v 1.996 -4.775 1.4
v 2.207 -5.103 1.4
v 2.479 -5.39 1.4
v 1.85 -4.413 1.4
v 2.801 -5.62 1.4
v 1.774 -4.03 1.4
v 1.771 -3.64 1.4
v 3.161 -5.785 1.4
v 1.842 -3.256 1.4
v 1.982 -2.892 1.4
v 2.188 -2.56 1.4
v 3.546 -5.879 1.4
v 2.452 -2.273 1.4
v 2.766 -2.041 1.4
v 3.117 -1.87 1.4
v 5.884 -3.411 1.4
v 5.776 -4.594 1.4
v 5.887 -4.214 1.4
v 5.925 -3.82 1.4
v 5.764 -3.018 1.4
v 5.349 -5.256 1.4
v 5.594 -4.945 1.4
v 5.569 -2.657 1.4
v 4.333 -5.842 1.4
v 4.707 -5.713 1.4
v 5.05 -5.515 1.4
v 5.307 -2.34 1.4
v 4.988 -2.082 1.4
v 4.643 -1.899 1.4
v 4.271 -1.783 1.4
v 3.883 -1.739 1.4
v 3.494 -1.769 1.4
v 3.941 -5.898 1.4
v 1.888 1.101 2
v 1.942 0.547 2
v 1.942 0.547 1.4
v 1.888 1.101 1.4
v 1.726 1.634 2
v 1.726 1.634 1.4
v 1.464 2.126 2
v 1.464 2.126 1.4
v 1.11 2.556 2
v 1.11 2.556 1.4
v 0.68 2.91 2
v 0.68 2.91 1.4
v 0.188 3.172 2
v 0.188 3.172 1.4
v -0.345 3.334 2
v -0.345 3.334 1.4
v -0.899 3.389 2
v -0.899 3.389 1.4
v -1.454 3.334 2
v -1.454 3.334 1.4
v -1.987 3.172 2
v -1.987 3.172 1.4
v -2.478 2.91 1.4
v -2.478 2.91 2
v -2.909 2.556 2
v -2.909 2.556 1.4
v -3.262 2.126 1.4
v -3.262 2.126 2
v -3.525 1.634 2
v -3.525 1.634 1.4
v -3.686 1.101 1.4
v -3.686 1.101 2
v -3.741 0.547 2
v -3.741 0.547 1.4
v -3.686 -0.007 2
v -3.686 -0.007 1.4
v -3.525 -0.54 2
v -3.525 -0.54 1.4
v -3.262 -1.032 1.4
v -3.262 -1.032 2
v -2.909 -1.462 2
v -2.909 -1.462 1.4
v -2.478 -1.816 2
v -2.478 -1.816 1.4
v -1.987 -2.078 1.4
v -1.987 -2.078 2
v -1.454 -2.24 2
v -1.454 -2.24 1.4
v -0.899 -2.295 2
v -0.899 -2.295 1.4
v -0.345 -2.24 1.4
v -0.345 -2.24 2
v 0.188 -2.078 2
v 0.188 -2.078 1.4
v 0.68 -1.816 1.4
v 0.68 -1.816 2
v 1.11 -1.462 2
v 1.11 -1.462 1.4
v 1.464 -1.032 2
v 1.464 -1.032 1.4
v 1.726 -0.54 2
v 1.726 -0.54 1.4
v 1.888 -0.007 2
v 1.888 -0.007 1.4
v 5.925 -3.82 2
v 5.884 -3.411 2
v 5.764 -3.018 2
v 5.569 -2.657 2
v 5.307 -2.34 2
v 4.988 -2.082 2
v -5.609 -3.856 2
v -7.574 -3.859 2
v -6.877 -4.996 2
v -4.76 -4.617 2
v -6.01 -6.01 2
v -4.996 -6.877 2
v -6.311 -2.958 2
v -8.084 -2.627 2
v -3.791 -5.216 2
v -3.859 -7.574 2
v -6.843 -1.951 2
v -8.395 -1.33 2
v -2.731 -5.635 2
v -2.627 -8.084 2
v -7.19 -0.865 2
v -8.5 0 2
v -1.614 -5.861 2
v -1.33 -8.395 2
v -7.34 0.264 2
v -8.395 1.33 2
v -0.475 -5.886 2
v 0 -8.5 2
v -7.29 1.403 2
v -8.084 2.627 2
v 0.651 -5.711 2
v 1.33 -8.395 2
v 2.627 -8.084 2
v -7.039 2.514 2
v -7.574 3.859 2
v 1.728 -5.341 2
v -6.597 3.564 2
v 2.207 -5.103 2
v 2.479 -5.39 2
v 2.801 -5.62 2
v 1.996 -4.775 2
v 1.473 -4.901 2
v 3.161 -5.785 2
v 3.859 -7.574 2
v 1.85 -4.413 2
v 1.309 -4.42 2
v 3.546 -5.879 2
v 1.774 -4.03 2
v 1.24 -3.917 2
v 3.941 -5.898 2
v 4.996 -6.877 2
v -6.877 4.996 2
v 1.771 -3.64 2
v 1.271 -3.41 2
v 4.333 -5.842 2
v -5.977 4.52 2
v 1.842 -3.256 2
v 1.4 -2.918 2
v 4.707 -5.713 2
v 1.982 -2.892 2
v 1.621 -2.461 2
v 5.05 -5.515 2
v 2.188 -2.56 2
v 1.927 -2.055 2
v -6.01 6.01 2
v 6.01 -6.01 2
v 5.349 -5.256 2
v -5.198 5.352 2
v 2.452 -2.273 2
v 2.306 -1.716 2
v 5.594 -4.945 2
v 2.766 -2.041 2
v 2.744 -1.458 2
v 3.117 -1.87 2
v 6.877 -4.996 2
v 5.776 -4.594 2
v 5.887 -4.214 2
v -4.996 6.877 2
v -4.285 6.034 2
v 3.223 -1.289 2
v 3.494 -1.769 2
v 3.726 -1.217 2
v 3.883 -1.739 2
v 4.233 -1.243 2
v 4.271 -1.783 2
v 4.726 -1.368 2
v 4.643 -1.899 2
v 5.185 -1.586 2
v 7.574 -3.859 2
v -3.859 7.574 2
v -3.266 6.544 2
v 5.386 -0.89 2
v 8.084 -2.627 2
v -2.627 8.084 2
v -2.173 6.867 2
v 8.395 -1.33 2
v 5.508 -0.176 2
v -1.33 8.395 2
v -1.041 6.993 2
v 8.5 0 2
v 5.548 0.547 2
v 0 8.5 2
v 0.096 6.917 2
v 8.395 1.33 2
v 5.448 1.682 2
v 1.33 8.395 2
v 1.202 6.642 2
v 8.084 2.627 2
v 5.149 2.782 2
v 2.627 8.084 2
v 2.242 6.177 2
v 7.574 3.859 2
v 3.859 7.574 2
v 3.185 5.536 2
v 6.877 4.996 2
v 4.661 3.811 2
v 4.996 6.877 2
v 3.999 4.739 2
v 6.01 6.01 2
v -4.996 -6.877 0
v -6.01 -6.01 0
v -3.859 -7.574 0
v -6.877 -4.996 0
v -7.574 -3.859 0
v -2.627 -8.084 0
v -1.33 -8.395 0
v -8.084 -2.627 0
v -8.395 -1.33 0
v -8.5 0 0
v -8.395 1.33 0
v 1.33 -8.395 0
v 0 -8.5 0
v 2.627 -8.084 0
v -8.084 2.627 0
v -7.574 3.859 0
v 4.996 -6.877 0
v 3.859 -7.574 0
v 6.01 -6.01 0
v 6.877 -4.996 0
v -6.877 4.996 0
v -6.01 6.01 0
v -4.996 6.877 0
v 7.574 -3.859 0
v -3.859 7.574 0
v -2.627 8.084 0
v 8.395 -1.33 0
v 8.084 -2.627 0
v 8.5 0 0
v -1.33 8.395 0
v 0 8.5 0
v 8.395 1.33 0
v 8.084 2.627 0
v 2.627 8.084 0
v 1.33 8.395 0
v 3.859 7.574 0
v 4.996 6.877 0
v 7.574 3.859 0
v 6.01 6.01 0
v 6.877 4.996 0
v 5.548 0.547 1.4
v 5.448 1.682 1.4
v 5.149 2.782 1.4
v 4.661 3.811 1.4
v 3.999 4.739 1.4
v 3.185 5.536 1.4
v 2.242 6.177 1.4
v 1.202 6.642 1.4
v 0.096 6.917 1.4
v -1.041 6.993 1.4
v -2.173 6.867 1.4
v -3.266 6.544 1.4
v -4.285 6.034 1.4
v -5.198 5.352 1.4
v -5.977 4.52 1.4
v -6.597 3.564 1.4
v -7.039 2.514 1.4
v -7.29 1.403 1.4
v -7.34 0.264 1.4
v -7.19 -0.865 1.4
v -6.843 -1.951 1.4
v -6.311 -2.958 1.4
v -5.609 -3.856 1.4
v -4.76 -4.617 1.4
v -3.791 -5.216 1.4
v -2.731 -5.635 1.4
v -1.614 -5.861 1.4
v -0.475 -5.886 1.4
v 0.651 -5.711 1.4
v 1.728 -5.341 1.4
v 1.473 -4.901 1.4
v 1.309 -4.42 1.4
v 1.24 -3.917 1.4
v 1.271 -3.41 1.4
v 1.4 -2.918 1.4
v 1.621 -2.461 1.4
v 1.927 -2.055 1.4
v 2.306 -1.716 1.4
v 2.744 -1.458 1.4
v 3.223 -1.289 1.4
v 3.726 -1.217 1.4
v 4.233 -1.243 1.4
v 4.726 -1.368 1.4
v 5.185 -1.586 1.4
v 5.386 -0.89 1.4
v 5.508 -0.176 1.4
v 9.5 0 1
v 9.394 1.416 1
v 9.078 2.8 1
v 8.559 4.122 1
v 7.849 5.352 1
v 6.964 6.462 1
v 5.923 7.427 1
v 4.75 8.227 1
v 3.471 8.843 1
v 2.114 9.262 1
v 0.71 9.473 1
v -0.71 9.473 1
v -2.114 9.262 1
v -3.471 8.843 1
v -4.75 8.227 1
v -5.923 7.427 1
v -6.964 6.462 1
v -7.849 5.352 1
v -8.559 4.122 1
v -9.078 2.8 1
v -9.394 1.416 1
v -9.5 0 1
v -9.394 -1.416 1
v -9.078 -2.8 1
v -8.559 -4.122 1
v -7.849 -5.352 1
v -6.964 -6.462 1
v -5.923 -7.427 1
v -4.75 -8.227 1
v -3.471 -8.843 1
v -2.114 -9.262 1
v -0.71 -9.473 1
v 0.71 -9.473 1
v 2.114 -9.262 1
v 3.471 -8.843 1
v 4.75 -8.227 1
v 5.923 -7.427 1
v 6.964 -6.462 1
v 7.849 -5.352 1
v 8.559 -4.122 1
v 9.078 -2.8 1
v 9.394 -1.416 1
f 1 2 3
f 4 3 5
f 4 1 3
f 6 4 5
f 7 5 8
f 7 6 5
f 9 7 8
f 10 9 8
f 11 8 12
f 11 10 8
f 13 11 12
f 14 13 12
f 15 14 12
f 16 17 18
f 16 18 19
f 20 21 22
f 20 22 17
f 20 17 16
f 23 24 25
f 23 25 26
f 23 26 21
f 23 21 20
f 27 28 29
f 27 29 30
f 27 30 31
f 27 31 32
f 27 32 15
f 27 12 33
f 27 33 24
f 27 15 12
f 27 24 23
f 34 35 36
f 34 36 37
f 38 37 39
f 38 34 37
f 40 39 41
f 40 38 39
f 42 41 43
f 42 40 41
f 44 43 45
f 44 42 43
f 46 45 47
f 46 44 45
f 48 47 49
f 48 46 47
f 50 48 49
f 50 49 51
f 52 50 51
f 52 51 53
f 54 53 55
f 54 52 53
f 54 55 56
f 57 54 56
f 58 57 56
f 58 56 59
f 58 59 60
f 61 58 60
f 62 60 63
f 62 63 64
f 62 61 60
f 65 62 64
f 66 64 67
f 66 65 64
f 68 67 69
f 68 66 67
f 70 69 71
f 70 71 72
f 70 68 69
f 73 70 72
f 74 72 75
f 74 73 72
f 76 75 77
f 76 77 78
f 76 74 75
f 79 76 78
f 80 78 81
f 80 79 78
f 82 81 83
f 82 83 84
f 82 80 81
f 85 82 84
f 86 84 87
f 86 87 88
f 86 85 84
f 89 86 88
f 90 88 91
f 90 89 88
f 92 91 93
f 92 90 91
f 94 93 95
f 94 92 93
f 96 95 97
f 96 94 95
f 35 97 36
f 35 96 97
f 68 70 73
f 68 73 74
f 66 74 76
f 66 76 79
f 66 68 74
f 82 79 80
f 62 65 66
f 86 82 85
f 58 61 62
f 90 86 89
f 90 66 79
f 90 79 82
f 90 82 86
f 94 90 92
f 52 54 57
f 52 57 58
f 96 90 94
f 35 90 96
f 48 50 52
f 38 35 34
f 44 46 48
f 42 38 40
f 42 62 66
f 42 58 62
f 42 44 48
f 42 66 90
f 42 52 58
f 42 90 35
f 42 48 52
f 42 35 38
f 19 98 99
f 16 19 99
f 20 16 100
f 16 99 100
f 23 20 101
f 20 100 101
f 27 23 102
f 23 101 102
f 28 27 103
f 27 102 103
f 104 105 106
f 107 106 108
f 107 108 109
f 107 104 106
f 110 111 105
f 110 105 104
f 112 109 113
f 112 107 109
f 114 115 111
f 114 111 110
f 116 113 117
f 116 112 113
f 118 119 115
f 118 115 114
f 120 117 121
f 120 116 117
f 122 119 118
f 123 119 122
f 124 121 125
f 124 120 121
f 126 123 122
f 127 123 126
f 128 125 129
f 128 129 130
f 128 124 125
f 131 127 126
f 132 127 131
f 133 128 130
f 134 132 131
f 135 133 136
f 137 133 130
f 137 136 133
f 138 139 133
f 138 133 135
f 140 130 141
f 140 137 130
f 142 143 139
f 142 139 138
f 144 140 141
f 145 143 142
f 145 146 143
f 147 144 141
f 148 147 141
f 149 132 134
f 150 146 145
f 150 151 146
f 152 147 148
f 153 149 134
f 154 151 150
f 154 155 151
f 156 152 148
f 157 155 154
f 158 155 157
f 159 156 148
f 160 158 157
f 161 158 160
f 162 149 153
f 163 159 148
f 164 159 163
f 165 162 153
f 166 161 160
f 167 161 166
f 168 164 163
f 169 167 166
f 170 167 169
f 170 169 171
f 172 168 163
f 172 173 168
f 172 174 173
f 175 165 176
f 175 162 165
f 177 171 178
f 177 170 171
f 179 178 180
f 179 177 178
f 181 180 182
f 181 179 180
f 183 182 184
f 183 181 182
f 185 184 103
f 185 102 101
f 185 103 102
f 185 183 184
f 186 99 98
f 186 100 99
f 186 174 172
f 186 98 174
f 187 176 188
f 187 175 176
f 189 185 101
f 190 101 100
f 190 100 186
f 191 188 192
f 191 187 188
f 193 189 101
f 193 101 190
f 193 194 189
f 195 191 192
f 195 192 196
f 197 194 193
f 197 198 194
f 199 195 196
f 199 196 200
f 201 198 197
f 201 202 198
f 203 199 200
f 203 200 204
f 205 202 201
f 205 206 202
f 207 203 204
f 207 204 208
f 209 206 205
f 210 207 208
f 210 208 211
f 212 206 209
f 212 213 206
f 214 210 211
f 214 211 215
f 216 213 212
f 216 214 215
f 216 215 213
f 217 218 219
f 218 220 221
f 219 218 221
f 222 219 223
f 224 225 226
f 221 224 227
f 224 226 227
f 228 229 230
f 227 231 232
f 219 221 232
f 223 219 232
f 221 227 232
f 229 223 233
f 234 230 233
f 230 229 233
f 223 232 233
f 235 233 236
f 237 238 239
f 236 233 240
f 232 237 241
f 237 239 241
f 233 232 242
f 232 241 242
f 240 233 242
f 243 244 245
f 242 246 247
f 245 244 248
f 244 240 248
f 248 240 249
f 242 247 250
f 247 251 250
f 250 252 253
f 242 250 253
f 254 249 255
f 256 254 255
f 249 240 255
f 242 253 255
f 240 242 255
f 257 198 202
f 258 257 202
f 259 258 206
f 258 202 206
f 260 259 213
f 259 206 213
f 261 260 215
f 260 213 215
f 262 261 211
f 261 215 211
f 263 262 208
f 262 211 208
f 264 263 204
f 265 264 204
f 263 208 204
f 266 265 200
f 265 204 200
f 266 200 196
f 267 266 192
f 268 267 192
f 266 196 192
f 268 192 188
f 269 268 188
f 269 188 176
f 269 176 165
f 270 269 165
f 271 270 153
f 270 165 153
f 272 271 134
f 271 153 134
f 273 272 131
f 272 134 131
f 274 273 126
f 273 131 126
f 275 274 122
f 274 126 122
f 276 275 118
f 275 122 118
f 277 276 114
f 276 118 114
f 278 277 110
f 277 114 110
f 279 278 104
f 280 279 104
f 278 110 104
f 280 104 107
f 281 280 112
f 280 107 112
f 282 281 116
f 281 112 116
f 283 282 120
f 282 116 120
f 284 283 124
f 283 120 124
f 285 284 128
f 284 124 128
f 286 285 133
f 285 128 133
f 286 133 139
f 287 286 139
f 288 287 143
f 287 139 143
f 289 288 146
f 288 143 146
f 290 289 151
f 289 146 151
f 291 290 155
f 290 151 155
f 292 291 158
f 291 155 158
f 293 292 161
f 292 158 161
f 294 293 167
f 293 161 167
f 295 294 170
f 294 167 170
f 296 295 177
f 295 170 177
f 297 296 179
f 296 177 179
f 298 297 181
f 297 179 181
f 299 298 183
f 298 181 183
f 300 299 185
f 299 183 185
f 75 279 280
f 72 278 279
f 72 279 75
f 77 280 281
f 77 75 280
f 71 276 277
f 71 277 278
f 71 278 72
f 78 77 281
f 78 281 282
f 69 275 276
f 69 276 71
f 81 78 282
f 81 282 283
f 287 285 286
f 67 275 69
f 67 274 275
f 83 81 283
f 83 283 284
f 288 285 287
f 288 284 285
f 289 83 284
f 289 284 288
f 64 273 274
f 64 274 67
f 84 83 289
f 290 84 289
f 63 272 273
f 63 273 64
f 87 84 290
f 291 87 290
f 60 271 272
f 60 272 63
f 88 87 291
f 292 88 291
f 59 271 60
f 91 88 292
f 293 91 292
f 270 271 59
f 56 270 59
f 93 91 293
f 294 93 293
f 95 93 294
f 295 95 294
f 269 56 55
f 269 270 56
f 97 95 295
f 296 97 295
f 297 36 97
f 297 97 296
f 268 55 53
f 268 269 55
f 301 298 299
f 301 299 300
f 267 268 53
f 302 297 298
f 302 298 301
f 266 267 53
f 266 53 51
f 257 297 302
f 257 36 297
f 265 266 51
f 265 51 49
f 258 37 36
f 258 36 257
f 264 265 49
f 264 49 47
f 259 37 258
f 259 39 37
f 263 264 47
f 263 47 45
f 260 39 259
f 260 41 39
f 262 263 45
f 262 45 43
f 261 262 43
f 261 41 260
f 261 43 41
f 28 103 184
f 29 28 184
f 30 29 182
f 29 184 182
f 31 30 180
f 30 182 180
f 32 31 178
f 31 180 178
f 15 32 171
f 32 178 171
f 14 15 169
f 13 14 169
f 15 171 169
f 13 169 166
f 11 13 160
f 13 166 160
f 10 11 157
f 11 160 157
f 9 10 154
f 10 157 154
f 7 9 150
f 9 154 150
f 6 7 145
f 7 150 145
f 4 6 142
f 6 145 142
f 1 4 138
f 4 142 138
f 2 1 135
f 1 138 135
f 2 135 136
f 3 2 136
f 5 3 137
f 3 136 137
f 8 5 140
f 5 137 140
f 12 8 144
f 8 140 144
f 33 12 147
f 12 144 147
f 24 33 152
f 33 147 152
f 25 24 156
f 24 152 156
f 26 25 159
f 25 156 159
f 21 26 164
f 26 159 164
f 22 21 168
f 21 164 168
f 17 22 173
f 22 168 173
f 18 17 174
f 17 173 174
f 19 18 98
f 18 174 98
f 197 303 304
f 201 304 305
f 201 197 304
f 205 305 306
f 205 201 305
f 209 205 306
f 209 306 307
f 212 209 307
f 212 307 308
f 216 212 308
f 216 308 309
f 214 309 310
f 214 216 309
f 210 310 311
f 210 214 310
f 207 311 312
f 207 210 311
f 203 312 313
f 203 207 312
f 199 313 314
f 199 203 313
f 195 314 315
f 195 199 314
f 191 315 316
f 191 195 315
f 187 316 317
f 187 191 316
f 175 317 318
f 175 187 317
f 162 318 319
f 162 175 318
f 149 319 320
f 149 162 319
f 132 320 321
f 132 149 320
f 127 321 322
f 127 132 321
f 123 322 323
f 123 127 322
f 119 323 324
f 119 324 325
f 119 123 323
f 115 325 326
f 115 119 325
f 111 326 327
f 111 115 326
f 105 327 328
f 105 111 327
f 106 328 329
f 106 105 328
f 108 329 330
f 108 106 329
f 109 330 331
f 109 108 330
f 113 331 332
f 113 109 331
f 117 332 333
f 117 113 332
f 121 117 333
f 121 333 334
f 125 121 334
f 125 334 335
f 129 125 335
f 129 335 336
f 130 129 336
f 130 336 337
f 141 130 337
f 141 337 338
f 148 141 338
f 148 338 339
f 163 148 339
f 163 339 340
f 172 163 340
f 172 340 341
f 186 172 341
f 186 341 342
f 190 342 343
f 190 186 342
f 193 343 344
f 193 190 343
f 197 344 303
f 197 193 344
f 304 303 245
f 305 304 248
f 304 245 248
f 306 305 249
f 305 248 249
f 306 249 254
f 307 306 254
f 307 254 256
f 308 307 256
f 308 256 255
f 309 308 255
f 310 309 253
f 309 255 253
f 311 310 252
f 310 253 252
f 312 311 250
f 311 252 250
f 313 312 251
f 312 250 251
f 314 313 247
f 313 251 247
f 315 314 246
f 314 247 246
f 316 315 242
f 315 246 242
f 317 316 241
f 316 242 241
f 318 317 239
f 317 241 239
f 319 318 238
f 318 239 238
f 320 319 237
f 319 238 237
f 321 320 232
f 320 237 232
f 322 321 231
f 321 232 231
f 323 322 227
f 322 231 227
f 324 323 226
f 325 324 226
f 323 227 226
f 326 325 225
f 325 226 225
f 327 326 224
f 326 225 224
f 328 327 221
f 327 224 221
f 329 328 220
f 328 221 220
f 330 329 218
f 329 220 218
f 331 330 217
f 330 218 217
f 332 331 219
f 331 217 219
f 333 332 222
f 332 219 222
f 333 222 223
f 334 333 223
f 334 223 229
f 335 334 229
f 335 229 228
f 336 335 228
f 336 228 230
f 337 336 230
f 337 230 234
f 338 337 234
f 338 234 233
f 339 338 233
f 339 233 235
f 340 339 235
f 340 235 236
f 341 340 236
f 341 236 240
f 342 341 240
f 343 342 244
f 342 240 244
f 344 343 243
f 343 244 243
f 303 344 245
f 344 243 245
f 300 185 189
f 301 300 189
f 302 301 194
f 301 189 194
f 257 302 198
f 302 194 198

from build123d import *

# Parameters (mm, degrees)
F0_R     = 9.5
F1_DEPTH = 2
F2_SIZE  = 0.99999
F3_R     = 2.8417127556
F4_DEPTH = 0.6


# Not quite as in the source:
# - a fillet or chamfer is up to 0.001 mm smaller than in the source, because OpenCascade refuses the exact size


with BuildPart() as f1:
    # F0 (on Top) → F1 (new body)
    with BuildSketch(Plane.XY):
        Circle(F0_R)
    extrude(amount=F1_DEPTH)

    # F2 (size 1 in the source; OpenCascade refuses exactly that, so slightly less here)
    f2_edges = [f1.edges().sort_by_distance(p)[0] for p in [
        (-9.5, 0, 2),
        (-9.5, 0, 0),
    ]]
    chamfer(f2_edges, length=F2_SIZE)

    # F3 (on face) → F4 (cut)
    with BuildSketch(Plane.XY.offset(2)):
        with BuildLine():
            ThreePointArc((5.185311865, -1.585620522), (5.4568534532, -0.5346363532), (5.5482306838, 0.5470071919))
            ThreePointArc((5.5482306838, 0.5470071919), (-6.3080923619, 4.0561385788), (1.7284324719, -5.3407049258))
            ThreePointArc((1.7284324719, -5.3407049258), (1.9271777373, -2.0549469321), (5.185311865, -1.585620522))
        make_face()
        with Locations((-0.8992319345, 0.5470071919)):
            Circle(F3_R, mode=Mode.SUBTRACT)
        with BuildLine():
            ThreePointArc((4.9880163164, -2.0816963378), (2.3134948891, -2.4105852235), (2.2065269261, -5.1031287457))
            ThreePointArc((2.2065269261, -5.1031287457), (3.8442696915, -3.8197955903), (4.9880163164, -2.0816963378))
        make_face()
        with BuildLine():
            ThreePointArc((4.9880163164, -2.0816963378), (3.8442696915, -3.8197955903), (2.2065269261, -5.1031287457))
            ThreePointArc((2.2065269261, -5.1031287457), (4.5230773814, -5.7866116654), (5.9249295276, -3.8197955903))
            ThreePointArc((5.9249295276, -3.8197955903), (5.6757845042, -2.8325272153), (4.9880163164, -2.0816963378))
        make_face()
    extrude(amount=-F4_DEPTH, mode=Mode.SUBTRACT)


solid = f1.part
